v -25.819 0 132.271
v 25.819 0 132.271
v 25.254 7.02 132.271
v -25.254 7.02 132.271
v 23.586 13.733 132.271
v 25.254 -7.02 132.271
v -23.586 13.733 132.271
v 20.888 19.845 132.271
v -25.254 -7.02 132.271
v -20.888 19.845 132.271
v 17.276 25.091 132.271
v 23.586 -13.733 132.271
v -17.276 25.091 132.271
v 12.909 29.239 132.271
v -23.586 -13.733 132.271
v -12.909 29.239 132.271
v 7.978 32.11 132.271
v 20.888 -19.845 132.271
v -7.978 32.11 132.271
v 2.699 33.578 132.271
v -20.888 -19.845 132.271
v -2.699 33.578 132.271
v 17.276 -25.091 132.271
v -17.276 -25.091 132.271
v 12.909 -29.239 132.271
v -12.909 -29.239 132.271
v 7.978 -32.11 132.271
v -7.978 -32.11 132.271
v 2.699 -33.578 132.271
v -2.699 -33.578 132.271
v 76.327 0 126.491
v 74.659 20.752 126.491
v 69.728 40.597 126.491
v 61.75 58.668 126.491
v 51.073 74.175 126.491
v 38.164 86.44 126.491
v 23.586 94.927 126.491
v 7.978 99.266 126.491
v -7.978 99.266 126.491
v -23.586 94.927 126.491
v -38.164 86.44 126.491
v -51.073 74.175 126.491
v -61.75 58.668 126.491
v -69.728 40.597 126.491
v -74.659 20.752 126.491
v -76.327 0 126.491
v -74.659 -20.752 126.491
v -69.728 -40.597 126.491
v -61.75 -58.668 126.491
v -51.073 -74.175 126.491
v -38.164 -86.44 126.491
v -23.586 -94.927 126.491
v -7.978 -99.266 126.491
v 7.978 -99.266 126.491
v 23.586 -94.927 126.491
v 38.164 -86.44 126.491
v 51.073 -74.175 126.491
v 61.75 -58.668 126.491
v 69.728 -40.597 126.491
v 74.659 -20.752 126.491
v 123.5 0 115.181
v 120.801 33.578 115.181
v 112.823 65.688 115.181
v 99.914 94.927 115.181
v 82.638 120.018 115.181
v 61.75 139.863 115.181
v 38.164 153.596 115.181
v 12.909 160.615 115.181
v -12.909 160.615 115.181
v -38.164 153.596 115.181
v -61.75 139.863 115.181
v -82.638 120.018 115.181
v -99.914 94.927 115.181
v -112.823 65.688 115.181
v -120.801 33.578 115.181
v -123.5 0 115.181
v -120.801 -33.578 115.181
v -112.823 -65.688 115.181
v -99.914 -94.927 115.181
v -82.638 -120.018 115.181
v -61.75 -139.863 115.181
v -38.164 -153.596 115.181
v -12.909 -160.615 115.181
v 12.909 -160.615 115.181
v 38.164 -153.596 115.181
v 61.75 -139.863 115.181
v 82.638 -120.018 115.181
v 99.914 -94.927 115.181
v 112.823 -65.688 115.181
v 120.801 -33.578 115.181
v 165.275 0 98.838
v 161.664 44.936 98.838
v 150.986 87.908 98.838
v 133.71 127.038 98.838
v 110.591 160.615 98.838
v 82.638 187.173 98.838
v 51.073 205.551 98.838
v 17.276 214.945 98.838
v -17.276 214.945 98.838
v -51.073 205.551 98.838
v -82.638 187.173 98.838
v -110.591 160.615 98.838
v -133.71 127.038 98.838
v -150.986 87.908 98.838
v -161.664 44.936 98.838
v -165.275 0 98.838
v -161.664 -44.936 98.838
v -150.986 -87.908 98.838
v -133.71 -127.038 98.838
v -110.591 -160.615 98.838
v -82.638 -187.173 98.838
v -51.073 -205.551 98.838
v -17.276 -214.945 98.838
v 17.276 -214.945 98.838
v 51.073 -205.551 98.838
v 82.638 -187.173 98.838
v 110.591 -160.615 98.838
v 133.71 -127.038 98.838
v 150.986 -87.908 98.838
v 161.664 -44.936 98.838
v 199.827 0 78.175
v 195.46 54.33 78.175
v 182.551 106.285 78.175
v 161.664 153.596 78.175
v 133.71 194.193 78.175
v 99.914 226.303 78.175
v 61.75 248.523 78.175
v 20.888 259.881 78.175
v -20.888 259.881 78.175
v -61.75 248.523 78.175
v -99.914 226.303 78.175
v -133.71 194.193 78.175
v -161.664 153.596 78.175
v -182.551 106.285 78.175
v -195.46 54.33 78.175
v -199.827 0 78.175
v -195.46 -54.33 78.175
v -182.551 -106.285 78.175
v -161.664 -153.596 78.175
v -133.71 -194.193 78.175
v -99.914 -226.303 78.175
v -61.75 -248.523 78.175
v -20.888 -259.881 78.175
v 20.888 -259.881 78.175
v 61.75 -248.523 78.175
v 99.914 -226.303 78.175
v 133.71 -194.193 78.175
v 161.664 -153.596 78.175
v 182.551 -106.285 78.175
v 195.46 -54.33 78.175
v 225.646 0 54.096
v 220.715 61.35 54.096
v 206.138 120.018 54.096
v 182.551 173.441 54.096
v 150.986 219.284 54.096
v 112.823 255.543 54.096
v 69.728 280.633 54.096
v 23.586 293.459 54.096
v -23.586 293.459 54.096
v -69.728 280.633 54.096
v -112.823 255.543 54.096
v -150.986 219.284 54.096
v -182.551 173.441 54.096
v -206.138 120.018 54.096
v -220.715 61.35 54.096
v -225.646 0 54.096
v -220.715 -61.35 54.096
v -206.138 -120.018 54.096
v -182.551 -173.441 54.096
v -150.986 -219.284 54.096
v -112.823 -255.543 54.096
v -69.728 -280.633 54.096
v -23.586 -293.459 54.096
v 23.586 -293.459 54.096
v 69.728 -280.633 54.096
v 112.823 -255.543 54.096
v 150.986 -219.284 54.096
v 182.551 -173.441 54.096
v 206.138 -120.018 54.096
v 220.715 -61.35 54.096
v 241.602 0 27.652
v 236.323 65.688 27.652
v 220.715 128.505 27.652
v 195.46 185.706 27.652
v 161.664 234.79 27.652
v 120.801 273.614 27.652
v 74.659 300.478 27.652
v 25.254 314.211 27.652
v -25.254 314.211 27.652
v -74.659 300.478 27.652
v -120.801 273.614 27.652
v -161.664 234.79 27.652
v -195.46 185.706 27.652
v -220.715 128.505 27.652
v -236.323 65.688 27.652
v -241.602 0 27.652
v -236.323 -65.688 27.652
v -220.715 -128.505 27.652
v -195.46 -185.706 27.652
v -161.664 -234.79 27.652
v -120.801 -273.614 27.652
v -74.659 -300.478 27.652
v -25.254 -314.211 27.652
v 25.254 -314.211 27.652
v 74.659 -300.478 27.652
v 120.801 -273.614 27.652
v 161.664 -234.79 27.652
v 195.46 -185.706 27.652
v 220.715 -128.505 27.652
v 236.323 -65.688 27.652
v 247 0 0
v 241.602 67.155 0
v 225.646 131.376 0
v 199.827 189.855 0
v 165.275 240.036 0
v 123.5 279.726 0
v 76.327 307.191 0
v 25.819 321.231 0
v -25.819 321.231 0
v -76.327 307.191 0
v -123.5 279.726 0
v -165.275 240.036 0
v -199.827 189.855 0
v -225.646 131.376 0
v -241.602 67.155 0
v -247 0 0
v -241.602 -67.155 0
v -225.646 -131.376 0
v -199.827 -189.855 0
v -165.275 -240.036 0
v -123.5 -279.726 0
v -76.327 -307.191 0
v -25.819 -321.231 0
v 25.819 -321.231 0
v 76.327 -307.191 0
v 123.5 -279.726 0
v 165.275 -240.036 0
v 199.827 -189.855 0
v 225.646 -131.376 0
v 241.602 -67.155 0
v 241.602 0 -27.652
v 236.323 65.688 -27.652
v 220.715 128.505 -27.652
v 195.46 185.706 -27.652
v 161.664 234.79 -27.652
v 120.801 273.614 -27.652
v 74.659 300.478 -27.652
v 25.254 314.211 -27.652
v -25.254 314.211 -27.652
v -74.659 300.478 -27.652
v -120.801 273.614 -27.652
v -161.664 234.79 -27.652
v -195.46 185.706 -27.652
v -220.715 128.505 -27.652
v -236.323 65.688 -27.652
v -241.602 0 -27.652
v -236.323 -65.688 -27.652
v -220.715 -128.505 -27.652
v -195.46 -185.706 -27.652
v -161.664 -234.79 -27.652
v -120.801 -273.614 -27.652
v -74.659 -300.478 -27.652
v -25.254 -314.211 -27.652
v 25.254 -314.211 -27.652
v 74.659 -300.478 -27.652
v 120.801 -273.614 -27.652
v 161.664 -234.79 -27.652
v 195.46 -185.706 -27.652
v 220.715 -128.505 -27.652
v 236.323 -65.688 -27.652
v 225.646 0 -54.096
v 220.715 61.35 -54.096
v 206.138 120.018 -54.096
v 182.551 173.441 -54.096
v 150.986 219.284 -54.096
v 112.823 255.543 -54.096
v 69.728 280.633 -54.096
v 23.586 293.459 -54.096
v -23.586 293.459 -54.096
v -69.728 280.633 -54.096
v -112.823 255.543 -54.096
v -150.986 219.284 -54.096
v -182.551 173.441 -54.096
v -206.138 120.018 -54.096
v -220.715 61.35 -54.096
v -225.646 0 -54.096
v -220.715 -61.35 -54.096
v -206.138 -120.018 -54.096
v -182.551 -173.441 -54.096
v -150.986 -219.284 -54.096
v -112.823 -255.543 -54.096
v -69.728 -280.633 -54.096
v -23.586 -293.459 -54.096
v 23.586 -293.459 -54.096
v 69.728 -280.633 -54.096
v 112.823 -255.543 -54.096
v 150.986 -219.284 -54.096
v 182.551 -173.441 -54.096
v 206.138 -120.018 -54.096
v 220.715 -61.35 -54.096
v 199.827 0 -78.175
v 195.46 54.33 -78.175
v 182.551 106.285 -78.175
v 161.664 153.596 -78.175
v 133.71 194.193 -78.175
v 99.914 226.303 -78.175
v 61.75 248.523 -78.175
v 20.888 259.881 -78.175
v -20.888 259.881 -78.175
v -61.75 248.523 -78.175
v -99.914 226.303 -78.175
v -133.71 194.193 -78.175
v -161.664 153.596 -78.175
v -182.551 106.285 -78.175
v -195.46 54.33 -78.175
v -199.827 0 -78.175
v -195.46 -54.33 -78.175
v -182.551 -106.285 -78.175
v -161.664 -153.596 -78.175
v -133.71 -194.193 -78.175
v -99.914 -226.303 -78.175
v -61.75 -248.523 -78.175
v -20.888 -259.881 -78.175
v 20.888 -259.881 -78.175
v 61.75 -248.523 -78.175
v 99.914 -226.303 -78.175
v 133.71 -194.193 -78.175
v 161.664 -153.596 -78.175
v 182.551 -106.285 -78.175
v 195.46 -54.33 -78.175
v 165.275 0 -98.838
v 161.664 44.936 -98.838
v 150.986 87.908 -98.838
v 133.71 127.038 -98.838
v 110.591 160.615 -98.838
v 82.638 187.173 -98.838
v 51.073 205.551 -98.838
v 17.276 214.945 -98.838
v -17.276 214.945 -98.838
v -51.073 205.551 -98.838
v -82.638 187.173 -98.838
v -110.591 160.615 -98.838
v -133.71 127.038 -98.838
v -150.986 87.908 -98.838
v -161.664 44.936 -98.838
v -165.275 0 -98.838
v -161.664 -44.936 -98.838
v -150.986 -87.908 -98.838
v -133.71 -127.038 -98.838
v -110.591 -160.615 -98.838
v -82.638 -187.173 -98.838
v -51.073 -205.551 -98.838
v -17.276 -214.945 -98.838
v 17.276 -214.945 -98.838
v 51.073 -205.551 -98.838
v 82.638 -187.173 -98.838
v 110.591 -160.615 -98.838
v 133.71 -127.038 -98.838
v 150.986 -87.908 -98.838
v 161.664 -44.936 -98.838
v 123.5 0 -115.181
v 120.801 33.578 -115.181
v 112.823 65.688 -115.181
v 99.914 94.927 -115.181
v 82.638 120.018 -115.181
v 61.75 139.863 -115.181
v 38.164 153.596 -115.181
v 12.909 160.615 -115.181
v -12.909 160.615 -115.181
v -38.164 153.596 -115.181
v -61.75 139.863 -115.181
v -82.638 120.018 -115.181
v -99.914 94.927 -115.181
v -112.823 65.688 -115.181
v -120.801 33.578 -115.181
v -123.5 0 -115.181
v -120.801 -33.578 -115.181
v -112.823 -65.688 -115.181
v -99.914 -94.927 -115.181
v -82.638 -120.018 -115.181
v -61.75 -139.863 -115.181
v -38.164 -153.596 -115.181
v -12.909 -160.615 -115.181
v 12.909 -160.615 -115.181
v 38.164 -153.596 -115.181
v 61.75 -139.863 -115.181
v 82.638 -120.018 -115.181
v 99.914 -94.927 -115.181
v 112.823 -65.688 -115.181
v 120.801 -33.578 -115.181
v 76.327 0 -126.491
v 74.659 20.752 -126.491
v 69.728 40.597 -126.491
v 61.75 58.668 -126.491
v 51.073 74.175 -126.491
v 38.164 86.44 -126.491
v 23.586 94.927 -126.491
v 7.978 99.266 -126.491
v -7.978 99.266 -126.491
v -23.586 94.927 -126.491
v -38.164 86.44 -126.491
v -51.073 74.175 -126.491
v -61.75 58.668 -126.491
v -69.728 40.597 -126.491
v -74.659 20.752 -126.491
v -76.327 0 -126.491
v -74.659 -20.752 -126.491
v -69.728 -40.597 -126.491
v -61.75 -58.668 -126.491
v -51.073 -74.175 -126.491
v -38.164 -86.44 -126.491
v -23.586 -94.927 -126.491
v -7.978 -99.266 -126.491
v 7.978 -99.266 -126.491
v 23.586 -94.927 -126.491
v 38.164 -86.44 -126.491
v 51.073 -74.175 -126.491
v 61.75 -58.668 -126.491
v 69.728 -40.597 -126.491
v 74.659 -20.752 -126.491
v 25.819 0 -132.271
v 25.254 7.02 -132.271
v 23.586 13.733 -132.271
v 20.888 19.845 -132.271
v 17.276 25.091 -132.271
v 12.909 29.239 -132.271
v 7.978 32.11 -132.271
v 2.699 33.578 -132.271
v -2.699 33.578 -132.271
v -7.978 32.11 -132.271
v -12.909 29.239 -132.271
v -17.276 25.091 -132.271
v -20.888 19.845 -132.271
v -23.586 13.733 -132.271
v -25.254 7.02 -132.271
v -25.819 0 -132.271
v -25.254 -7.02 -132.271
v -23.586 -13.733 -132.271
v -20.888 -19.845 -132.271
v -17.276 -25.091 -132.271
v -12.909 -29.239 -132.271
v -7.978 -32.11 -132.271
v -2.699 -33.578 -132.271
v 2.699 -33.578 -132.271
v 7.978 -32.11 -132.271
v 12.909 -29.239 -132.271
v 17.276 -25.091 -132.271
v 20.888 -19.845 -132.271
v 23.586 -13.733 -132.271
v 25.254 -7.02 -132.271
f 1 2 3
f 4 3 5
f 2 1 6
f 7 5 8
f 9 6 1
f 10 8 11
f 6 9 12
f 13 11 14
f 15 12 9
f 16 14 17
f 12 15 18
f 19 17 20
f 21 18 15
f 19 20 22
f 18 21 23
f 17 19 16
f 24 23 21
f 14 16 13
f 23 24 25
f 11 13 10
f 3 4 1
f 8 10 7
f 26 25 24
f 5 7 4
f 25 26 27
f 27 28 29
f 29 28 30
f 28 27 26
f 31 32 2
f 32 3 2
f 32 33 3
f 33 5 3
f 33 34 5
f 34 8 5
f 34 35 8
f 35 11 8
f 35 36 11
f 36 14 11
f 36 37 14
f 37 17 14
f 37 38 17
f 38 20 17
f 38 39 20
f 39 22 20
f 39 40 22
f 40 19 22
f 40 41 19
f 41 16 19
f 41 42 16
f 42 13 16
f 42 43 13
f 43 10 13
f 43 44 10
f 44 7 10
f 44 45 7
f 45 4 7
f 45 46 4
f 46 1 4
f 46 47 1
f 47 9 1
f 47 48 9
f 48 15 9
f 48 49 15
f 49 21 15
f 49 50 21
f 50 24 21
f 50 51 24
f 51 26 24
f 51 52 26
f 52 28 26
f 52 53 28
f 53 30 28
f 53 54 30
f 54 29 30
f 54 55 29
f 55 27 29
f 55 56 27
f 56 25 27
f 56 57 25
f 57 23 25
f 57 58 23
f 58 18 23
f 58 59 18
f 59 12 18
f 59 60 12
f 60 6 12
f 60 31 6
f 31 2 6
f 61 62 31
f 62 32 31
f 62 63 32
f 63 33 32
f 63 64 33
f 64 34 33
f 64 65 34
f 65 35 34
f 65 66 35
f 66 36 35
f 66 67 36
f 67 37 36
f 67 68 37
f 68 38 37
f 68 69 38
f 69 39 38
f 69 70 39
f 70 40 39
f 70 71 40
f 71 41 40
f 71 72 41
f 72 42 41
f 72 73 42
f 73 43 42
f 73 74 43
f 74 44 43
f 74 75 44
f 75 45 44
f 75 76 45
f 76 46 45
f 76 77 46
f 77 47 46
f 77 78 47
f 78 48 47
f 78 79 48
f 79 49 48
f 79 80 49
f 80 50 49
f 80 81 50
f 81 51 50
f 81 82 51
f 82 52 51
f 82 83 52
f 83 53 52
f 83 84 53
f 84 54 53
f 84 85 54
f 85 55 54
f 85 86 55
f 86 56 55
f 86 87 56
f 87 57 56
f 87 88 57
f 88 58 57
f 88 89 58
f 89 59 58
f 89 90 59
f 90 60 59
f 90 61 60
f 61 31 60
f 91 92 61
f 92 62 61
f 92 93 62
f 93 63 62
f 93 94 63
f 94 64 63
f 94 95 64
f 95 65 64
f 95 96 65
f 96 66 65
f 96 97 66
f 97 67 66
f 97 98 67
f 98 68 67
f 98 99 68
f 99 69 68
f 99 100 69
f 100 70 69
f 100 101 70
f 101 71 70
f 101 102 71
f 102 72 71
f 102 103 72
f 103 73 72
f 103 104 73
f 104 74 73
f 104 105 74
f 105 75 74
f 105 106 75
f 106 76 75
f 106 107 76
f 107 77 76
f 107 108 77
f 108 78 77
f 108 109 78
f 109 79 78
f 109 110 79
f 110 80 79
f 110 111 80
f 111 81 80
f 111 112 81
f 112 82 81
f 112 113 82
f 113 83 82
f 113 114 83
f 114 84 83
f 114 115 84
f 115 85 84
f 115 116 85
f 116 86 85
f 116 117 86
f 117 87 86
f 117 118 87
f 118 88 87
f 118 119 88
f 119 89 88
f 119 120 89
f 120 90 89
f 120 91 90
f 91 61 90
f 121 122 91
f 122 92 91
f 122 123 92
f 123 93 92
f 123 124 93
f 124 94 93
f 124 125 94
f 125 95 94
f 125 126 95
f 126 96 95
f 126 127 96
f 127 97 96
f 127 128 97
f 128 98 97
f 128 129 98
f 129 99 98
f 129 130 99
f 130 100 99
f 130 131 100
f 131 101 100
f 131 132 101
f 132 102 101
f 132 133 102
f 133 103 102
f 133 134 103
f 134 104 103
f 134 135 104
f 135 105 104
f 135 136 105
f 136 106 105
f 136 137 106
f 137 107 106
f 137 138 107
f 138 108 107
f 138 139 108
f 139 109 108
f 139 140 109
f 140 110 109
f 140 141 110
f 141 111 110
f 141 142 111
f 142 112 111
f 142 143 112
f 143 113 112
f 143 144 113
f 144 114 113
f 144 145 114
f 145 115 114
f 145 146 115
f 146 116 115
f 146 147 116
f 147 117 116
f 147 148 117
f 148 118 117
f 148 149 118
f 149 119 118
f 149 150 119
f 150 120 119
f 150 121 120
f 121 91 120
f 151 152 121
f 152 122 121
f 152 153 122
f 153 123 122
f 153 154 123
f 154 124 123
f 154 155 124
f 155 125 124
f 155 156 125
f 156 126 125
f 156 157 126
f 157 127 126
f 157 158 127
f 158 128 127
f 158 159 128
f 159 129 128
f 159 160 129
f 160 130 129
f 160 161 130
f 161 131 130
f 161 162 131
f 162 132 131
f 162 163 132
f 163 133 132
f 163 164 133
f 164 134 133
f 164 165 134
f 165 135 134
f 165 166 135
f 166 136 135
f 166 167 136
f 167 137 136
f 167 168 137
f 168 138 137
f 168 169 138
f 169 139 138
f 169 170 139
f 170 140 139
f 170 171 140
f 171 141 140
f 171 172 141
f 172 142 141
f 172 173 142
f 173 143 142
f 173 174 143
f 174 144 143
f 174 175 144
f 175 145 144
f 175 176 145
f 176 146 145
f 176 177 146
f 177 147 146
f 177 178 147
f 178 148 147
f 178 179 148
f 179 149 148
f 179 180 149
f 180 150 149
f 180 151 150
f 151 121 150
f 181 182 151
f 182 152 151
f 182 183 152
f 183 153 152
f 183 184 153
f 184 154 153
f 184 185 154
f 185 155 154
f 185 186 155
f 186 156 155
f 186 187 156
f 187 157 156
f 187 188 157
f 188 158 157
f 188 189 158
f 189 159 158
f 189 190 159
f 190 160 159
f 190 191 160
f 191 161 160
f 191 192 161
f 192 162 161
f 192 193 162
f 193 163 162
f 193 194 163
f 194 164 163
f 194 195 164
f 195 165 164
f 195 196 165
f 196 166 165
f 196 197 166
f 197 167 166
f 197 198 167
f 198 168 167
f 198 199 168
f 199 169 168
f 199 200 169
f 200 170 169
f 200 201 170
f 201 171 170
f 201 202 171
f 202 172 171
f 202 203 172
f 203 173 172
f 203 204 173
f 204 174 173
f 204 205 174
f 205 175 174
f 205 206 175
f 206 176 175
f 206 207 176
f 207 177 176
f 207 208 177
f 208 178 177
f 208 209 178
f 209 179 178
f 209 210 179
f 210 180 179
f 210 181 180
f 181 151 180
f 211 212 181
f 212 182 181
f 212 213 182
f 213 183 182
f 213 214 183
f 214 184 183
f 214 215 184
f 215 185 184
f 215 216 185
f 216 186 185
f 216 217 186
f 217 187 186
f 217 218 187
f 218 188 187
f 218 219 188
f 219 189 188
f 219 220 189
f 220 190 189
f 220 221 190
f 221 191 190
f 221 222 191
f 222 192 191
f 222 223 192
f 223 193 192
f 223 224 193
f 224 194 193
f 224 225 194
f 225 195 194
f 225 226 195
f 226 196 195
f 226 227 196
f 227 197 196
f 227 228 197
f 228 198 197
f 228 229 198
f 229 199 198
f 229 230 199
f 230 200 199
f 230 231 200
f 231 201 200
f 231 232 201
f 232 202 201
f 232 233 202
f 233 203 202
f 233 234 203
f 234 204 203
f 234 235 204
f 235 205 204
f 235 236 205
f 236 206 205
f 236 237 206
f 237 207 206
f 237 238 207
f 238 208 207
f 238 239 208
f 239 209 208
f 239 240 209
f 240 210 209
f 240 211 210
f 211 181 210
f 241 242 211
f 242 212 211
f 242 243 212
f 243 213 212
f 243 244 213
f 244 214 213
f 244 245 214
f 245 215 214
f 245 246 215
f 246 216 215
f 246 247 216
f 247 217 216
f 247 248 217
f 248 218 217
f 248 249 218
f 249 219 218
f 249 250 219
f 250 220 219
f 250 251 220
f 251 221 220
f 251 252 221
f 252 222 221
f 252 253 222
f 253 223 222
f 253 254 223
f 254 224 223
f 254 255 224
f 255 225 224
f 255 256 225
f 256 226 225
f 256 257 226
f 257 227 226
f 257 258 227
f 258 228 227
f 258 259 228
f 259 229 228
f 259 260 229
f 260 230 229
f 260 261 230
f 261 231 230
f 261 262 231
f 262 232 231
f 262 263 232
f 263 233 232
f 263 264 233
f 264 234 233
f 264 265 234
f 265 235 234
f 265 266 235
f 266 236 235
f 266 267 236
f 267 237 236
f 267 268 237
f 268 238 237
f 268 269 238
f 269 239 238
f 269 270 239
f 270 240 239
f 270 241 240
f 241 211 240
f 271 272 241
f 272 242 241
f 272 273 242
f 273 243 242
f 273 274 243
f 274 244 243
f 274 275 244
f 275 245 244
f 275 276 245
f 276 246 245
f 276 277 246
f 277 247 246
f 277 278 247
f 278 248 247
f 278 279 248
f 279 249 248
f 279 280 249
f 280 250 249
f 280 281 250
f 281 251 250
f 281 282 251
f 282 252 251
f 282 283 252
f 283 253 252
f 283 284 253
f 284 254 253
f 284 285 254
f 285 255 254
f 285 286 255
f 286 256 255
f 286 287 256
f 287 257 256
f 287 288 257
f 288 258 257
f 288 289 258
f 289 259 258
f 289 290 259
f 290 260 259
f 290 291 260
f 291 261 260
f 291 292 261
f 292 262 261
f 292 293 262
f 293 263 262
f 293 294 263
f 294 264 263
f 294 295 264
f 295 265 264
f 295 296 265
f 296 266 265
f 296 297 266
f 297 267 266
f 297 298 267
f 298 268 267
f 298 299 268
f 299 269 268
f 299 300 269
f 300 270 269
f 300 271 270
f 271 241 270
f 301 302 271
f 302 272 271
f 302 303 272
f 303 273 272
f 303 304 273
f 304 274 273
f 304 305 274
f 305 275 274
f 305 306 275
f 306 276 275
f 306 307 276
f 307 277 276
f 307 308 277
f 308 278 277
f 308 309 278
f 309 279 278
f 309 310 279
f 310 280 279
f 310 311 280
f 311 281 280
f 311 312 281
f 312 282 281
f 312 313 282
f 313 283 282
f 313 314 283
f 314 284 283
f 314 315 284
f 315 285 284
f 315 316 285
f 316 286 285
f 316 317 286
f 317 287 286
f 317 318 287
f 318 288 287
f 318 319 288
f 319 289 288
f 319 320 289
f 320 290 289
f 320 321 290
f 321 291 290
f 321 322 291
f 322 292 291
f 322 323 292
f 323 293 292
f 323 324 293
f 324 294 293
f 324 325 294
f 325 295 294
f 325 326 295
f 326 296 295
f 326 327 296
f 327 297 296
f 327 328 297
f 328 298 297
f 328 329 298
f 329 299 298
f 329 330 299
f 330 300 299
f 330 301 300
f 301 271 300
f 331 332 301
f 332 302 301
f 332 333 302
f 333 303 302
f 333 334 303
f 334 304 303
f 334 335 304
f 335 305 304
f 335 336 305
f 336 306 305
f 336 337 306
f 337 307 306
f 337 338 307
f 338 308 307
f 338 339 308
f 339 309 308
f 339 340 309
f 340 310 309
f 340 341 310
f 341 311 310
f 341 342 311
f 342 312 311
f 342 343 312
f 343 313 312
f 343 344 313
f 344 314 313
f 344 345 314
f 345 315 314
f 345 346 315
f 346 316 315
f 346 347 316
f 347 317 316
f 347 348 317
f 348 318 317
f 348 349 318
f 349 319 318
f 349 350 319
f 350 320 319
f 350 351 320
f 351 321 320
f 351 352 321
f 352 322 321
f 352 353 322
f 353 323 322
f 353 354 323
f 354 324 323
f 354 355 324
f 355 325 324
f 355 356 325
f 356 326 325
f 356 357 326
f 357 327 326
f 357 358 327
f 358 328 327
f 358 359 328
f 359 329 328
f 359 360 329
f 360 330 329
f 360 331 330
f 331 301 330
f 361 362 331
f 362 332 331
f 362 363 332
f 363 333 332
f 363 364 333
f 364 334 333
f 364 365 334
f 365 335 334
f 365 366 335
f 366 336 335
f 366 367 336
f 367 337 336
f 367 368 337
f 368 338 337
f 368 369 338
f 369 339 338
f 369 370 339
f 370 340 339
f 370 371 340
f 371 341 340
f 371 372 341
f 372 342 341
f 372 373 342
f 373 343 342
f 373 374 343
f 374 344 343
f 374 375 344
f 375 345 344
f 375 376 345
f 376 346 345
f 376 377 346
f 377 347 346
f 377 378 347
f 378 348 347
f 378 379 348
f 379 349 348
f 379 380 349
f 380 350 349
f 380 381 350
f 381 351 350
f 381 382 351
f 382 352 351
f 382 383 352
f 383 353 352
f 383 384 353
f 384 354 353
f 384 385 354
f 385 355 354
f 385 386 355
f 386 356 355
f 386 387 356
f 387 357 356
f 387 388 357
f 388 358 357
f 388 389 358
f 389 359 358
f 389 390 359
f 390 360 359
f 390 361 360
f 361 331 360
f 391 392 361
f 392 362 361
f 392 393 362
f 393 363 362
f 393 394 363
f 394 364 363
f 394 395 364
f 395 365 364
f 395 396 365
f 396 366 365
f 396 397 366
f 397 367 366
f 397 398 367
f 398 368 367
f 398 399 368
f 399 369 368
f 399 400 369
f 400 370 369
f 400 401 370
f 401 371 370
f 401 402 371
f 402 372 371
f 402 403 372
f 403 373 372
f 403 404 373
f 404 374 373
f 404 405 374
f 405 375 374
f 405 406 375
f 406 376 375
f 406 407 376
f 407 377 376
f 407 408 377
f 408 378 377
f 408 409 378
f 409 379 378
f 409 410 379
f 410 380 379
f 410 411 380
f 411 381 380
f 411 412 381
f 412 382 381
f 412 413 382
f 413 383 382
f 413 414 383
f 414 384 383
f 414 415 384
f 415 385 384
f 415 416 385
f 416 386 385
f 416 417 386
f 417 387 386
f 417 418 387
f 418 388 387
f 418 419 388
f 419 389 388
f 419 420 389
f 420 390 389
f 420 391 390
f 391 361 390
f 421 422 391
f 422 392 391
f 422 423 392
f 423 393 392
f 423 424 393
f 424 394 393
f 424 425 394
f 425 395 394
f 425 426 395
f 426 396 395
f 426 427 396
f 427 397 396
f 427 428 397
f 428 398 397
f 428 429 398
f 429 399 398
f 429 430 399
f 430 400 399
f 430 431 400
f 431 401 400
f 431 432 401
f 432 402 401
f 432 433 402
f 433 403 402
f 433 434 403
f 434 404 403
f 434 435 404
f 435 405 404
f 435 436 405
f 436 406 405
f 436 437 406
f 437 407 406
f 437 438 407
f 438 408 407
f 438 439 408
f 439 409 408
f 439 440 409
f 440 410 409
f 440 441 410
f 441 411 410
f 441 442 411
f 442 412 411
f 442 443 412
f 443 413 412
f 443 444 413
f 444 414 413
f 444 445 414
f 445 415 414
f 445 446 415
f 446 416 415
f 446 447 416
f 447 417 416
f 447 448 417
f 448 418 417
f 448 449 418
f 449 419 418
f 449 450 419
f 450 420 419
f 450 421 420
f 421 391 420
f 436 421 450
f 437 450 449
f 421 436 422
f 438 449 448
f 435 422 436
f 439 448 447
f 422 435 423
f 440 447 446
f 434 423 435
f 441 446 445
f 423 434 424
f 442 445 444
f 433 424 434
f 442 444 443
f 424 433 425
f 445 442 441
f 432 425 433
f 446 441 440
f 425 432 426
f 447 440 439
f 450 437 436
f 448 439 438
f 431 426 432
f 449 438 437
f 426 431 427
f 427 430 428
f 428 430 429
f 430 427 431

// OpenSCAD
// Generated by SolidPython 1.0.1 on 2020-07-29 00:46:51


scale(v = [13, 17, 7]) {
	sphere(r = 19);
}
/***********************************************
*********      SolidPython code:      **********
************************************************
 
# import packages: SolidPython
from solid import *
from solid.utils import *
from itertools import chain, combinations, permutations


class Resize:

    def __init__(self, scad_file):
        self.scad_file = scad_file
        #self.scad_file = import_scad(scad_file)
        # cone/cylinder param:
        self.r1 = 0
        self.r2 = 0
        self.h = 0
        # rectangular prism param:
        self.w = 0
        self.l = 0
        # ellipse param:
        self.r = 0

    # import OpenScad code (file name corresponds to shape)


    # classify shape + parameters
    def assign(self, param1, param2, param3):
        if self.scad_file == 'cone.scad':
            self.r1 = param1
            self.r2 = param2
            self.h = param3
        elif self.scad_file == 'cylinder.scad':
            self.r1 = param1
            self.r2 = param2
            self.h = param3
        elif self.scad_file == 'rectangularPrism.scad':
            self.h = param1
            self.l = param2
            self.w = param3
        else:
            self.r = param1
            self.h = param2

    # resize parameters
    def iterate(self):
        x = range(3, 20, 2)
        i = 1
        if self.scad_file == 'cone.scad':
            tempList = list(permutations(x, 2))
            for temp in tempList:
                param1 = temp[0]
                param2 = temp[1]
                filepath = 'produced_scad_files/' + 'cone' + str(param1) + '_' + str(param2) + '_' + '.scad'
                scad_render_to_file(cylinder(h=param1, r1=param2, r2=0), filepath)

        elif self.scad_file == 'cylinder.scad':
            tempList = list(permutations(x, 3))
            for temp in tempList:
                param1 = temp[0]
                param2 = temp[1]
                filepath = 'produced_scad_files/' + 'cylinder' + str(param1) + '_' + str(param2) + '_' + '.scad'
                scad_render_to_file(cylinder(h=param1, r1=param2, r2=param2), filepath)

        elif self.scad_file == 'rectangularPrism.scad':
            tempList = list(permutations(x, 3))
            for temp in tempList:
                param1 = temp[0]
                param2 = temp[1]
                param3 = temp[2]
                filepath = 'produced_scad_files/' + 'rectangularPrism' + str(param1) + '_' + str(param2) + '_' + str(
                    param3) + '.scad'
                scad_render_to_file(cube(size=(param1, param2, param3)), filepath)

        elif self.scad_file == 'ellipse.scad':
            tempList = list(permutations(x, 4))
            for temp in tempList:
                param1 = temp[0]
                param2 = temp[1]
                param3 = temp[2]
                param4 = temp[3]
                filepath = 'produced_scad_files/' + 'ellipse' + str(param1) + '_' + str(param2) + '_' + str(param3) + '_' + str(param4) + '.scad'
                scad_render_to_file(scale([param1, param2, param3])(sphere(r=param4)), filepath)

    def render_to_scadfile(self):
        scad_render_to_file(scad, 'example.scad') 
 
************************************************/
